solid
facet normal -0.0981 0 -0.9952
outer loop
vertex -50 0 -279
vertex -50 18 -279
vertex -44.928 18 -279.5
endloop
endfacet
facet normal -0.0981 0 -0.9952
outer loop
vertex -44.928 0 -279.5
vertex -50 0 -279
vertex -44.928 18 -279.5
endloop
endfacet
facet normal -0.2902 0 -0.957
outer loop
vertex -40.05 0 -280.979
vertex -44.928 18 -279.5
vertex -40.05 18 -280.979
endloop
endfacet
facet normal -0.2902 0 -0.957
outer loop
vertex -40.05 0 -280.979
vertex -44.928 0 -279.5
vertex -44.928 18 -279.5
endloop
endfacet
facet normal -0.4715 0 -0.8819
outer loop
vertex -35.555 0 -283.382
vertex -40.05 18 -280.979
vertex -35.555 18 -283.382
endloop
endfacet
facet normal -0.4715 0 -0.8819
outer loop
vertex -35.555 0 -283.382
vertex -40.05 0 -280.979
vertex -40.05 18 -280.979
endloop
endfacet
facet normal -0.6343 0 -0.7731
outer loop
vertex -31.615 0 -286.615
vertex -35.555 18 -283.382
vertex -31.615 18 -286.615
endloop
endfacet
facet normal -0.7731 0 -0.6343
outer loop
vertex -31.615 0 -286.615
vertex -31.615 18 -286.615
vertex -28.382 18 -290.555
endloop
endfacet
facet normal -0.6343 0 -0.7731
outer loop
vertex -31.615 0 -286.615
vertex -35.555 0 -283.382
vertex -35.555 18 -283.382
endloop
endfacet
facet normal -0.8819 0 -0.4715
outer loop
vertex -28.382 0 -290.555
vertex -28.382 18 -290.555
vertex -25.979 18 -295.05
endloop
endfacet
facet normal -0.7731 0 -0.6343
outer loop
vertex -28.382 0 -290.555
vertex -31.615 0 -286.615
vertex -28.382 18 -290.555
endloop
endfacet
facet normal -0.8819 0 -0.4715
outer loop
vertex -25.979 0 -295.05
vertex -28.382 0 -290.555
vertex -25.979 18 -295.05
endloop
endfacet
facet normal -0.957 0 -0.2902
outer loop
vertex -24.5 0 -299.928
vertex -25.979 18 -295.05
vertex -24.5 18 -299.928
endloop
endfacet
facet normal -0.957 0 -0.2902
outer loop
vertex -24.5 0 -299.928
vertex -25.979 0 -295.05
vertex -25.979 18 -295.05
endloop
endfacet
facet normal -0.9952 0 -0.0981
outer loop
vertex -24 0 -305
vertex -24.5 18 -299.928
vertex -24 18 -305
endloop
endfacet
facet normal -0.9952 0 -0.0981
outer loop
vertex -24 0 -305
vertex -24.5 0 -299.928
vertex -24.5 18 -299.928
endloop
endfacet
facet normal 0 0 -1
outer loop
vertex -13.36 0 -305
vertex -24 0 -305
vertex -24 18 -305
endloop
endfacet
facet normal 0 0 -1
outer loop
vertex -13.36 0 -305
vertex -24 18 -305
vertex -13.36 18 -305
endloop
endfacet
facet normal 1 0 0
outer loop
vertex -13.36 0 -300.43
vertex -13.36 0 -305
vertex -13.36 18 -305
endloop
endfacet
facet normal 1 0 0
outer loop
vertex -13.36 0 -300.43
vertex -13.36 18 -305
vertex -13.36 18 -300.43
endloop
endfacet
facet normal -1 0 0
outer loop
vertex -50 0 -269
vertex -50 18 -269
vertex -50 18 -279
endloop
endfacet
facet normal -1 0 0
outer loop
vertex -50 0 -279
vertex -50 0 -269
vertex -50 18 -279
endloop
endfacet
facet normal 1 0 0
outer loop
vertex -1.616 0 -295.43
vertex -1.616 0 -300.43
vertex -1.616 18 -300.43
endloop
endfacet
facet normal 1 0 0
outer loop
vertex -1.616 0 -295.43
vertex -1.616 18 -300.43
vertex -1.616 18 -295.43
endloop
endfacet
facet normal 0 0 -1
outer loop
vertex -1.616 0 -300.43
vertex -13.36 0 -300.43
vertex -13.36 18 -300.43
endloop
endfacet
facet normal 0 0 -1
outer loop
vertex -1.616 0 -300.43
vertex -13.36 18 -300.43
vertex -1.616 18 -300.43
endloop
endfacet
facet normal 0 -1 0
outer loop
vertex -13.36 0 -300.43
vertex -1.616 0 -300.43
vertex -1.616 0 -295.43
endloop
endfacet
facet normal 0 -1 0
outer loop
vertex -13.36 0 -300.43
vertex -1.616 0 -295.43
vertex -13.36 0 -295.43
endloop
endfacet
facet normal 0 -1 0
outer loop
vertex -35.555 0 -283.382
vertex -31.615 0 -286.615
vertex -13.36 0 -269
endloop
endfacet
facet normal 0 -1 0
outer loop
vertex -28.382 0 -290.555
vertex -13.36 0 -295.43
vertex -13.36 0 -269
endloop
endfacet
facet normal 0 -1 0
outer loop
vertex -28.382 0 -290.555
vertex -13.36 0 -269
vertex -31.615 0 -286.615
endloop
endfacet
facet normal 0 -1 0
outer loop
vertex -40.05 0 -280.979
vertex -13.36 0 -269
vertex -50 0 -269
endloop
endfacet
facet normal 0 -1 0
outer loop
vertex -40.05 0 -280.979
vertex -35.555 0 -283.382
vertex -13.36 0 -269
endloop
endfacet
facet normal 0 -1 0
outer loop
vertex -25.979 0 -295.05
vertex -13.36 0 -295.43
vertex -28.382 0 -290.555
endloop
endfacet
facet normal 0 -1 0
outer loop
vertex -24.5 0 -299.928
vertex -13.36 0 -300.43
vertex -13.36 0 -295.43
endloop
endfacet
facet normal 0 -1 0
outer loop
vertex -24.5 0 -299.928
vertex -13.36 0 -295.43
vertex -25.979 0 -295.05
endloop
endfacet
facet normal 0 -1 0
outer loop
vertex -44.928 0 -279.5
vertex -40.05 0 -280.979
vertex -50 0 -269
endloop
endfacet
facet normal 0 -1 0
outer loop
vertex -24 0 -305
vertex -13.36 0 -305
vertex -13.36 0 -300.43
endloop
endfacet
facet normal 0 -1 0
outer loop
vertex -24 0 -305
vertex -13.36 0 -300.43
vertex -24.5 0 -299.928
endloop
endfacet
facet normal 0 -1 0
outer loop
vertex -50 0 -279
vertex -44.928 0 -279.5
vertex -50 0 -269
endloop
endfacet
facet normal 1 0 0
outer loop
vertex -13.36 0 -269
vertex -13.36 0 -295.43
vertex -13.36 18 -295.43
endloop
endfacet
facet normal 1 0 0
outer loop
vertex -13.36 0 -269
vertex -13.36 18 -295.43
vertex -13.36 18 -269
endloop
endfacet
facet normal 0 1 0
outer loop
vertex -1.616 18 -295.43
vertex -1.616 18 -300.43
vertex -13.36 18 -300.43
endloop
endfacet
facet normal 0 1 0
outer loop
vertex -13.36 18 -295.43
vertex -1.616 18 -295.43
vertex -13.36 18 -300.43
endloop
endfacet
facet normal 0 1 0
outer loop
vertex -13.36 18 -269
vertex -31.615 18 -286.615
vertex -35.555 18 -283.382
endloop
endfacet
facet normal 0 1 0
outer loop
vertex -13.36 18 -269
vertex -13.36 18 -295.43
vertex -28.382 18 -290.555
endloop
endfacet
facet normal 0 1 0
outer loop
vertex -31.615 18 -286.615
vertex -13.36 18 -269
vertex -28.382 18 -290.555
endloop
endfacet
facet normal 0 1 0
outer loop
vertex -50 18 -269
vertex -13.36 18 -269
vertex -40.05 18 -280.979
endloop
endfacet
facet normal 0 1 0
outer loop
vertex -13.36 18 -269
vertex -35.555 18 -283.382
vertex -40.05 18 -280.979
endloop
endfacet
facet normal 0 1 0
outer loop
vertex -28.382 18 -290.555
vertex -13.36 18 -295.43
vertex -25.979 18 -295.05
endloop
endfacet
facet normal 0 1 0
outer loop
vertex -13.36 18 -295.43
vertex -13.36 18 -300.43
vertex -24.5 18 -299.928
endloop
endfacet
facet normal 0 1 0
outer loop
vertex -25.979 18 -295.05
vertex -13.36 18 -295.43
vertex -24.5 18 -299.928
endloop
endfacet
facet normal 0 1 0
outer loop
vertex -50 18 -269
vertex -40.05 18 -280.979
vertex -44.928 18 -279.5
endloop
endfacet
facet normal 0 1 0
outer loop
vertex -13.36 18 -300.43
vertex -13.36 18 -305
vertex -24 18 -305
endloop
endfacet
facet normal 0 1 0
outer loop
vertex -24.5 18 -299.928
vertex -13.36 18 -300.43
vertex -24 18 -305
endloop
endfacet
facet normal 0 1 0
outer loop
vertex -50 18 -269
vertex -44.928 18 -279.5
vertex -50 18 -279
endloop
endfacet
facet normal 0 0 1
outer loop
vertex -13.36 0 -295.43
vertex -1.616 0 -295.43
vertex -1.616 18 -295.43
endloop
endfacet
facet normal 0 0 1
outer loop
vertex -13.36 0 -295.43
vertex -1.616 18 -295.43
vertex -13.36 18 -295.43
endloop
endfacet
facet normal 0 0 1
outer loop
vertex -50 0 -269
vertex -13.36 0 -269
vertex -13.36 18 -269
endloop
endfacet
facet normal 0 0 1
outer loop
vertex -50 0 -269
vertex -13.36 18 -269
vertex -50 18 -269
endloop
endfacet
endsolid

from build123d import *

# Parameters (mm, degrees)
BOSS_EXTRUDE1_DEPTH = 18


with BuildPart() as part:
    # Sketch1 → Boss-Extrude1 (new body)
    with BuildSketch(Plane(origin=(0, 0, 0), x_dir=(1, 0, 0), z_dir=(0, 1, 0))):
        with BuildLine():
            Line((-24, 305), (-13.36, 305))
            Line((-13.36, 305), (-13.36, 300.43))
            Line((-13.36, 300.43), (-1.616090732, 300.43))
            Line((-1.616090732, 300.43), (-1.616090732, 295.43))
            Line((-1.616090732, 295.43), (-13.36, 295.43))
            Line((-13.36, 295.43), (-13.36, 269))
            Line((-13.36, 269), (-50, 269))
            Line((-50, 269), (-50, 279))
            ThreePointArc((-50, 279), (-31.615223689, 286.615223689), (-24, 305))
        make_face()
    extrude(amount=BOSS_EXTRUDE1_DEPTH)


solid = part.part
